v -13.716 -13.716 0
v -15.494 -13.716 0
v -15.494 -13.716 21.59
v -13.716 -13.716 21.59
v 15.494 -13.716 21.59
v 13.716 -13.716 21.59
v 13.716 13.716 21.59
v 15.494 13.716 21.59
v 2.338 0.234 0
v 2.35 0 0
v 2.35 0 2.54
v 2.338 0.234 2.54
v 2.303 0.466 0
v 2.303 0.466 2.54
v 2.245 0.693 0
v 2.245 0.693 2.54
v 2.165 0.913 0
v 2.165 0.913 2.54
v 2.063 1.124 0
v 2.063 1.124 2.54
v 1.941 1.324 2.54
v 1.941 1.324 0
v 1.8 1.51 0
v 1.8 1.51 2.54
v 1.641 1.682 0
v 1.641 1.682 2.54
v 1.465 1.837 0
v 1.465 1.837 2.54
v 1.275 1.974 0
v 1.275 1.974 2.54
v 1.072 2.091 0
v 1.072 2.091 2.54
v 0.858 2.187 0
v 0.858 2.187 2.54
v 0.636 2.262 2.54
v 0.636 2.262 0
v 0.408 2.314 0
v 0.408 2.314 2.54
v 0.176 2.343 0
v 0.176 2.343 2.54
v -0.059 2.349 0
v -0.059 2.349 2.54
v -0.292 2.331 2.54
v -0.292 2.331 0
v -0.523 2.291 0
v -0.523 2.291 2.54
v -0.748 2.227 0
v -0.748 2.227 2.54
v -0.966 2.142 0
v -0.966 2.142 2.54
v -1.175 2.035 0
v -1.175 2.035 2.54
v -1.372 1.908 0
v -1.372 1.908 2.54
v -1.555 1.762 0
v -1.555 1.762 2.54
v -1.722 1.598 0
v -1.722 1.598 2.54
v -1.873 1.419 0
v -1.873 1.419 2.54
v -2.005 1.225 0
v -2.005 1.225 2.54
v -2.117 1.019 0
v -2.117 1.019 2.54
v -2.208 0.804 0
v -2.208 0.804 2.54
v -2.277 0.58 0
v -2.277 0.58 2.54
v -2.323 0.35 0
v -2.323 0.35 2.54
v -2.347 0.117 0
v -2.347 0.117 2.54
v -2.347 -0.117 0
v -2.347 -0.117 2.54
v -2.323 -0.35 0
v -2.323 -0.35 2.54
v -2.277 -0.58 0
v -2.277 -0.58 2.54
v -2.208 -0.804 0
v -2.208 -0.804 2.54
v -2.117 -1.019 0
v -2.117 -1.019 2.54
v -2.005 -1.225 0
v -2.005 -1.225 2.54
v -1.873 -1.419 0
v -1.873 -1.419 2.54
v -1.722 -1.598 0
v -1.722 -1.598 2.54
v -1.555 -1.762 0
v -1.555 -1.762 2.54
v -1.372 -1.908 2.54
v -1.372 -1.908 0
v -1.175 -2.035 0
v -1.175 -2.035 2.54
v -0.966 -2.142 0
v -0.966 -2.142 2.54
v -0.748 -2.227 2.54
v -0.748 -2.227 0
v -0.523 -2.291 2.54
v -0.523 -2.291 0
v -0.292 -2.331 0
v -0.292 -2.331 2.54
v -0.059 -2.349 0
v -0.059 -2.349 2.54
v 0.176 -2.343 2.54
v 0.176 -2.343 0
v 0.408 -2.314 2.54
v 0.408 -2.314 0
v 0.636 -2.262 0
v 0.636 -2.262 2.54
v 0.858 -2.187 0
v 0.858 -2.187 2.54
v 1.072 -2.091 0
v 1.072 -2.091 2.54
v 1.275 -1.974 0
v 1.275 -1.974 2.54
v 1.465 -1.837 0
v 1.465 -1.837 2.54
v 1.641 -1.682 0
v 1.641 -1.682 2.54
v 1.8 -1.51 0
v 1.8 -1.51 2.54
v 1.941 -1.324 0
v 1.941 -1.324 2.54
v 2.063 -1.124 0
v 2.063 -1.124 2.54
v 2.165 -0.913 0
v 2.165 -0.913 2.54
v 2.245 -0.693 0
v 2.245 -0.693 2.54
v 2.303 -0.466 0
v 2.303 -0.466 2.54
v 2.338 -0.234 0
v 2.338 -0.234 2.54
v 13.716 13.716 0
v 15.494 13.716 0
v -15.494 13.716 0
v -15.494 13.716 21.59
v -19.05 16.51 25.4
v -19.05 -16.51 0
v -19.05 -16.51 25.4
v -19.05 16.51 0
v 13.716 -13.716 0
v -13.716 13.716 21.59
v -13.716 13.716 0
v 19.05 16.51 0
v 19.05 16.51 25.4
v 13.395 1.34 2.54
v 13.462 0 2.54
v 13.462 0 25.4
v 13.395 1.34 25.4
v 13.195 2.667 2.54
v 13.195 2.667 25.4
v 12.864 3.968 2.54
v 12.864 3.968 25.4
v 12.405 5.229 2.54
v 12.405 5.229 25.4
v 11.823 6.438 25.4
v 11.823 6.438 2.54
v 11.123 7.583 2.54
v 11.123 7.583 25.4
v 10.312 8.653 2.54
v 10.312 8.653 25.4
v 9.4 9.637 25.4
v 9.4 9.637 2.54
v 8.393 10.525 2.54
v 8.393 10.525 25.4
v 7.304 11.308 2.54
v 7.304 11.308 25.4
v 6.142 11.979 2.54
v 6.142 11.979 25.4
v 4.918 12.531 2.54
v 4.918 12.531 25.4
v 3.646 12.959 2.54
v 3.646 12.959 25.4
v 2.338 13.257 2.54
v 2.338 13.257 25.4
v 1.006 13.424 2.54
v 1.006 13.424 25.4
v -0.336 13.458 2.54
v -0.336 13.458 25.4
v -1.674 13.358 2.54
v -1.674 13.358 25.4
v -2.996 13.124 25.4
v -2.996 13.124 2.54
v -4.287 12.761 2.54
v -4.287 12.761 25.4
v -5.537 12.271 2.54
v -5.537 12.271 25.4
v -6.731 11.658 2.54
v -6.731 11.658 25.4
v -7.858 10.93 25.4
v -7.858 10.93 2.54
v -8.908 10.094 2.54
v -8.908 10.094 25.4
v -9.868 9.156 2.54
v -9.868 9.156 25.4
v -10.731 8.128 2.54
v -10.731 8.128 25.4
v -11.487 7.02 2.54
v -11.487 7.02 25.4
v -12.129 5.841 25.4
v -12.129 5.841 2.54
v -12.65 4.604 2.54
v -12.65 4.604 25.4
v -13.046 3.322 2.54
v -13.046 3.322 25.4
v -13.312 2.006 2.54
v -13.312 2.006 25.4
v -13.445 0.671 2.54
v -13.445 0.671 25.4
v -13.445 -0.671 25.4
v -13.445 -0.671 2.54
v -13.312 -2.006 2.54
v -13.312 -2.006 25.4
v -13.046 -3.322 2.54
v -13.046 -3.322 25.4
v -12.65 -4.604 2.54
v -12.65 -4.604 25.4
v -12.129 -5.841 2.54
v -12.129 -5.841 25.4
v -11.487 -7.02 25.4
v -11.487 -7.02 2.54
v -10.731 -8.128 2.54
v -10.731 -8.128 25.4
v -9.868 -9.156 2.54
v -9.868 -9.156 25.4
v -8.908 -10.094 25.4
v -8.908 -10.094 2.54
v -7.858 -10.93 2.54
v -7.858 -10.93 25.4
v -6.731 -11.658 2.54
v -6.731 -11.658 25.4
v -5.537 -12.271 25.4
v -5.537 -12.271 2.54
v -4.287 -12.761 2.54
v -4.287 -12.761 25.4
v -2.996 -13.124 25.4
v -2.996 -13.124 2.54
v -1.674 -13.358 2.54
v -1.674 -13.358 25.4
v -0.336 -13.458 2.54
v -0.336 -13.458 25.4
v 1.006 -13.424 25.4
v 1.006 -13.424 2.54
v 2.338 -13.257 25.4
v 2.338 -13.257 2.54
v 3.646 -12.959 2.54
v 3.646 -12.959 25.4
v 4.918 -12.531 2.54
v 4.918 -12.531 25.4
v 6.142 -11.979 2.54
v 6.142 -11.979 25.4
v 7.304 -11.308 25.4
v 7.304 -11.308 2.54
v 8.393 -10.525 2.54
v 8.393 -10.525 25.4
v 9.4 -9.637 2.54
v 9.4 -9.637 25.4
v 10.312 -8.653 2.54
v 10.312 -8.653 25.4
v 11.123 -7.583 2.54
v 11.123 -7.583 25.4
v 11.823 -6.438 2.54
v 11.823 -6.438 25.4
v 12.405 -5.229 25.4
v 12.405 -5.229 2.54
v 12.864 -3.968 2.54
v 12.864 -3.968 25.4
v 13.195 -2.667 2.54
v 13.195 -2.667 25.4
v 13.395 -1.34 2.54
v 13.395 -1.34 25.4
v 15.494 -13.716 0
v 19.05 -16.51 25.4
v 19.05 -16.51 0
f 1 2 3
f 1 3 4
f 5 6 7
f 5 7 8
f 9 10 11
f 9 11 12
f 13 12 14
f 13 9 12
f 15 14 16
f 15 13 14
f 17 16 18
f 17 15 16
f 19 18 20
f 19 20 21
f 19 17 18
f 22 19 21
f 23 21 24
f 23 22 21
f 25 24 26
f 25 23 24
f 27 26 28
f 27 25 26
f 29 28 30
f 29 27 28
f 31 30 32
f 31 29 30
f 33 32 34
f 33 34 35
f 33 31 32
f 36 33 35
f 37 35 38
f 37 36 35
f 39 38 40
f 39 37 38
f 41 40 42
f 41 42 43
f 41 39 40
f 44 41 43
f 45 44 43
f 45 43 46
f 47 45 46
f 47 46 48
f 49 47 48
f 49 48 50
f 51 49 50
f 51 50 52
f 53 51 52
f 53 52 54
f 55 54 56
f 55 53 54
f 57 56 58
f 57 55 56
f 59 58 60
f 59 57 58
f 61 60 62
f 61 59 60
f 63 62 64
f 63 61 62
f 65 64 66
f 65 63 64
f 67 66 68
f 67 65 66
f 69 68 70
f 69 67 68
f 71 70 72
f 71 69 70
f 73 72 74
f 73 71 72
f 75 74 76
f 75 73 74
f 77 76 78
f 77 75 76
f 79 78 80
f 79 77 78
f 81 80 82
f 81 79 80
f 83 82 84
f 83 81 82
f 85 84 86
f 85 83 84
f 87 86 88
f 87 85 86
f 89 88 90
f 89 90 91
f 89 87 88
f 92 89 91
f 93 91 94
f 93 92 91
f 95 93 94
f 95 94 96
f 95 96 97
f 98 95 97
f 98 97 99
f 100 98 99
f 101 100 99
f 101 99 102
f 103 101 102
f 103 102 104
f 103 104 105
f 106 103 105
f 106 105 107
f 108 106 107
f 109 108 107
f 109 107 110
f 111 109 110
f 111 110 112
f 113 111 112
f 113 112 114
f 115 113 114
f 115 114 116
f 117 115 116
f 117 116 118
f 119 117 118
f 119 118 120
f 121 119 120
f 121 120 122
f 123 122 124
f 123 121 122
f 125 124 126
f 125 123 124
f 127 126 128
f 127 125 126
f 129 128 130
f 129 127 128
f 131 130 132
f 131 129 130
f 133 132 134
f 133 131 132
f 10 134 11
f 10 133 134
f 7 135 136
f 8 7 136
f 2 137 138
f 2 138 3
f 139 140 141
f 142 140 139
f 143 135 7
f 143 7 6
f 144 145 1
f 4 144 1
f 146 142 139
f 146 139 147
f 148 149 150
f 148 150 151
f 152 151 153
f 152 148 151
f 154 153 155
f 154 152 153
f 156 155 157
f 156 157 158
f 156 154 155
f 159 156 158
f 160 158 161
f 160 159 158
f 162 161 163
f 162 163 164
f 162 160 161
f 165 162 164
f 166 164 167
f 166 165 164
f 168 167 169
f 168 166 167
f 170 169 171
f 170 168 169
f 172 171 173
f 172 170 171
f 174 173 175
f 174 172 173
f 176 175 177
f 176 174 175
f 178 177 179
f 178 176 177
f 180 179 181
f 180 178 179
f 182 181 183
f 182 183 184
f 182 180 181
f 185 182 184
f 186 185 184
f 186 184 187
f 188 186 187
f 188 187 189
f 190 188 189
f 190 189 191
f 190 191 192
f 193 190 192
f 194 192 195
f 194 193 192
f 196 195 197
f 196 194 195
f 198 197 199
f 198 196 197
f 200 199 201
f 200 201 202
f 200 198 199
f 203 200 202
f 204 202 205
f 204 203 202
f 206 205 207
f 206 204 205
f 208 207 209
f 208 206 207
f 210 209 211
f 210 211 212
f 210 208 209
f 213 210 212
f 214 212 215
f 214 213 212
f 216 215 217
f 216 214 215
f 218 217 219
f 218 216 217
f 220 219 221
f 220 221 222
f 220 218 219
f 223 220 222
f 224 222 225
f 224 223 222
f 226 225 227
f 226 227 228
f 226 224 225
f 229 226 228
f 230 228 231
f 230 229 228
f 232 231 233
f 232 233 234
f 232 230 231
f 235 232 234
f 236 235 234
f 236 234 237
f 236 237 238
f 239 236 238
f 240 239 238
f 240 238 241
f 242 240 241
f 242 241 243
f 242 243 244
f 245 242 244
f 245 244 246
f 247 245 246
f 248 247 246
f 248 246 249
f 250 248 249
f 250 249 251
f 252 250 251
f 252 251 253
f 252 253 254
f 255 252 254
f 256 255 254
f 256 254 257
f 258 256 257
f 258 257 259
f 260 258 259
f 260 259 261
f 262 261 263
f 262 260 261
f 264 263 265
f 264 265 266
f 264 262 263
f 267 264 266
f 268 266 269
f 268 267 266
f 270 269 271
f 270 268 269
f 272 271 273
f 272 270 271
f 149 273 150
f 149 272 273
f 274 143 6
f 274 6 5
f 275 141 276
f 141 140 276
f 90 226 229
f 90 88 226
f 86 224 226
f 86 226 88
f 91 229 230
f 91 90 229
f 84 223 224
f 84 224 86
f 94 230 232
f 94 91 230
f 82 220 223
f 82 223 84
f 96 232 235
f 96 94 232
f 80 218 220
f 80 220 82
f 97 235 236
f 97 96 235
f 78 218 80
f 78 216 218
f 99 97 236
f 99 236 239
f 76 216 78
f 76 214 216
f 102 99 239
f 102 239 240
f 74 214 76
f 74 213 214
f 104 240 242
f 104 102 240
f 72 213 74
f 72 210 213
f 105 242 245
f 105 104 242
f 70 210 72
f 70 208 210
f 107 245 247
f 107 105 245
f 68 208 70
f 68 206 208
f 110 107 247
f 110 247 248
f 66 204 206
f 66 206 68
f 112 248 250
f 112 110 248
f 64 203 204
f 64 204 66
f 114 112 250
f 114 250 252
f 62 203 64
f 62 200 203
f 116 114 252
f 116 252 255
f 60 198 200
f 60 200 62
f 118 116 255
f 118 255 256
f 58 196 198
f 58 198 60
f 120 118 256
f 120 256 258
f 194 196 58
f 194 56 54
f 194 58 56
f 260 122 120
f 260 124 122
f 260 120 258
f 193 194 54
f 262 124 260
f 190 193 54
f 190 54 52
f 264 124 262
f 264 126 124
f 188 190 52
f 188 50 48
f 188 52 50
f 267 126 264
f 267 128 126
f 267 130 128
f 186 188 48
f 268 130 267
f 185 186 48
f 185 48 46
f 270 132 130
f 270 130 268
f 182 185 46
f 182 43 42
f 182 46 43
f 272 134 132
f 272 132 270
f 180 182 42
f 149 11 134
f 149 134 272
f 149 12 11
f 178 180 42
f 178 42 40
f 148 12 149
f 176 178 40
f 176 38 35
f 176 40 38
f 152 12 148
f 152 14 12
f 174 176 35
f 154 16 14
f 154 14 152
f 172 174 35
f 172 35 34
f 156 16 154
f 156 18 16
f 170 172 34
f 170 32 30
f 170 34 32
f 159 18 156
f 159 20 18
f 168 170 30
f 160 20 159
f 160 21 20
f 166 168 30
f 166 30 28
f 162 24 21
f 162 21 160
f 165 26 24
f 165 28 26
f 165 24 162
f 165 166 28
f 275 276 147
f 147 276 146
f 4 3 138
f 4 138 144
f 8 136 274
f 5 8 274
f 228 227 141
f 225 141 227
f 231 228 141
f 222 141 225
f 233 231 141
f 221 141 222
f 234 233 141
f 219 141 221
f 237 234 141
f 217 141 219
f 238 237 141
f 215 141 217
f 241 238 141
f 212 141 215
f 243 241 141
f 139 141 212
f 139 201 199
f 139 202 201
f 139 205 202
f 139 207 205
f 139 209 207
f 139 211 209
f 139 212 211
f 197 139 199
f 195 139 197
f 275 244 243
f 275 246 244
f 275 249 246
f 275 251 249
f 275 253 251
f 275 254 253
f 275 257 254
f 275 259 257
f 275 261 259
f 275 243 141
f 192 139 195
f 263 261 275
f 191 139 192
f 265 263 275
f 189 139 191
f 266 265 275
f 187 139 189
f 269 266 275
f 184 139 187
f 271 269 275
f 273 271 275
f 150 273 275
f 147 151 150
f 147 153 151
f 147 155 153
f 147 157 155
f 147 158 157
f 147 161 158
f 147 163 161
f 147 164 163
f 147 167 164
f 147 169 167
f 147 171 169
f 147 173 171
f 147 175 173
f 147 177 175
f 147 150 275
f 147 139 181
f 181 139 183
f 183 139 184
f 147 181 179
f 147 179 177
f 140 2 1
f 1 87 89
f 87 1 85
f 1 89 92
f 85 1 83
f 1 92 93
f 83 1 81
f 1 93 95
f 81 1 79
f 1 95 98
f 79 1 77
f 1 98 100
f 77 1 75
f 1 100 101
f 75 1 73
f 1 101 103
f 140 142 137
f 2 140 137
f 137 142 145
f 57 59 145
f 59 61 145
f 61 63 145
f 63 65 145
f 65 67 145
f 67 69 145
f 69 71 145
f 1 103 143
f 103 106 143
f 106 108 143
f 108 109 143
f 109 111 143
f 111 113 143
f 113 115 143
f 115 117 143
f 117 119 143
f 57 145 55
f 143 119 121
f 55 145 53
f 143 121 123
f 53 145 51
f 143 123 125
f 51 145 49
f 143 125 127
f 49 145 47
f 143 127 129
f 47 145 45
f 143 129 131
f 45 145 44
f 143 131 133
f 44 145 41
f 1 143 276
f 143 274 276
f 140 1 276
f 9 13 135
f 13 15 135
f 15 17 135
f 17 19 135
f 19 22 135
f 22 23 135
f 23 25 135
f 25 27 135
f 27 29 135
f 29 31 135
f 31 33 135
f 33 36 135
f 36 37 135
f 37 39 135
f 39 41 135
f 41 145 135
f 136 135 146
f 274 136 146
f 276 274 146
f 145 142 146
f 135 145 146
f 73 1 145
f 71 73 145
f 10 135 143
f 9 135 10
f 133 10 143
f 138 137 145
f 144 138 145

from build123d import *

# Parameters (mm, degrees)
F0_W     = 38.1
F0_H     = 33.02
F0_R     = 2.3495
F1_DEPTH = 2.54
F2_W     = 38.1
F2_H     = 33.02
F2_R     = 13.462
F3_DEPTH = 22.86
F4_W     = 1.778
F4_H     = 27.432
F5_DEPTH = 21.59


with BuildPart() as f1:
    # F0 (on Top) → F1 (new body)
    with BuildSketch(Plane.XY):
        Rectangle(F0_W, F0_H)
        Circle(F0_R, mode=Mode.SUBTRACT)
    extrude(amount=F1_DEPTH)

    # F2 (on face) → F3 (join)
    with BuildSketch(Plane.XY.offset(2.54)):
        Rectangle(F2_W, F2_H)
        Circle(F2_R, mode=Mode.SUBTRACT)
    extrude(amount=F3_DEPTH)

    # F4 (on face) → F5 (cut)
    with BuildSketch(Plane(origin=(0, 0, 0), x_dir=(1, 0, 0), z_dir=(0, 0, -1))):
        with Locations((14.605, 0)):
            Rectangle(F4_W, F4_H)
        with Locations((-14.605, 0)):
            Rectangle(F4_W, F4_H)
    extrude(amount=-F5_DEPTH, mode=Mode.SUBTRACT)


solid = f1.part
